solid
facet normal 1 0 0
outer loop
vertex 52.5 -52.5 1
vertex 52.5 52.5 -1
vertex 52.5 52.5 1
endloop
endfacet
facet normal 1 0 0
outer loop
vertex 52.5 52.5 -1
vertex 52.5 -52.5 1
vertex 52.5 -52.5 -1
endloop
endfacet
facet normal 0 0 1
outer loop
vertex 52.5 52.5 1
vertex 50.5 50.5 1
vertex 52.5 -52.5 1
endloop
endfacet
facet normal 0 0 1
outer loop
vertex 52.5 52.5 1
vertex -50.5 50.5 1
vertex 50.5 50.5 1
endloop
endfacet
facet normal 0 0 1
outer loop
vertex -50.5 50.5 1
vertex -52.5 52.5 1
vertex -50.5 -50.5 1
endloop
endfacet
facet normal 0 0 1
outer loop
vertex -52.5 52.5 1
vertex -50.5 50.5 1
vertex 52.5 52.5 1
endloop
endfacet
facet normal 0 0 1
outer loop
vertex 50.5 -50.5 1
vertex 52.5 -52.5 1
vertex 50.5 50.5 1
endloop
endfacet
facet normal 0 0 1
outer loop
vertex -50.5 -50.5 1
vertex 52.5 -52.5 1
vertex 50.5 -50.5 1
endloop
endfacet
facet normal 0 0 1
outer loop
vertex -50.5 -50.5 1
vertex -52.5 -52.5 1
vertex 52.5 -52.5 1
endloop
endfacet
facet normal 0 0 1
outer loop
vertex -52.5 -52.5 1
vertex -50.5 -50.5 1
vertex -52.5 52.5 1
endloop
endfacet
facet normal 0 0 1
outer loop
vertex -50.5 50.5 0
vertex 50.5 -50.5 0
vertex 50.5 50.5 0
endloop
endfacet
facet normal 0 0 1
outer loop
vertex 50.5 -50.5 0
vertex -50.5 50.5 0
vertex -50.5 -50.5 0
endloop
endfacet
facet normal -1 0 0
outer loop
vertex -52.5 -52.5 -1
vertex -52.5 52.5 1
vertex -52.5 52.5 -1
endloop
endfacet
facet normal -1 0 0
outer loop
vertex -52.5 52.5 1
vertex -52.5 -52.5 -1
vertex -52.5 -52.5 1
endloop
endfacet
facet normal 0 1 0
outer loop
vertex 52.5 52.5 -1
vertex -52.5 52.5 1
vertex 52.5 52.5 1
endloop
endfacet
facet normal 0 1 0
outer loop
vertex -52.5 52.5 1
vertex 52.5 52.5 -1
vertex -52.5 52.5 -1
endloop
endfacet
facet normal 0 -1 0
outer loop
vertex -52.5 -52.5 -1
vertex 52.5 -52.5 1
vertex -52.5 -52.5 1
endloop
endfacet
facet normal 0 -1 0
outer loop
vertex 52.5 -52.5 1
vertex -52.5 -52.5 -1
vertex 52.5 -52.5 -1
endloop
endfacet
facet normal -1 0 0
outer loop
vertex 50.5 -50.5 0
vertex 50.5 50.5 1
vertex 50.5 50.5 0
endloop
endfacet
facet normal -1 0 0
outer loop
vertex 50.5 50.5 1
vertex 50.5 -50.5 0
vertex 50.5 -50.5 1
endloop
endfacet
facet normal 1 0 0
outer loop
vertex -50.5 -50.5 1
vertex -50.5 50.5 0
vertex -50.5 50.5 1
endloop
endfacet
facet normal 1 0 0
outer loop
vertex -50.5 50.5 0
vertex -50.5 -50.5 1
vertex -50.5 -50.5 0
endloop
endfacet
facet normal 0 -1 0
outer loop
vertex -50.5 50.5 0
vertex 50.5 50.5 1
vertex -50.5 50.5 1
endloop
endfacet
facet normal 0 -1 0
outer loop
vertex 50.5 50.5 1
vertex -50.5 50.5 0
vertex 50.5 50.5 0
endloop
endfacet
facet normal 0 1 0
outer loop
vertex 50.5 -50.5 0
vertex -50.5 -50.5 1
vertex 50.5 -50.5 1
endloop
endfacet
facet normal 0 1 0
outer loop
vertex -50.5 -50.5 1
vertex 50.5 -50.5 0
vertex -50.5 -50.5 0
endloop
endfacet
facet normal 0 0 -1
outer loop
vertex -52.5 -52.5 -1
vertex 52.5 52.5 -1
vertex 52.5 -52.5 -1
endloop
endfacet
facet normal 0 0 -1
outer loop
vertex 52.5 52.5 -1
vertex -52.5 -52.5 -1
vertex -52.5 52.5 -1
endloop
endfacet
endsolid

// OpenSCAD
size = 100;
ext = 5;
wall = 4;
height = 1;

module img() {
	translate([-size/2,-size/2]) 
		linear_extrude(height, convexity= 4)
			resize([size,size]) 
				offset(r = 0.5) import("anonimous.dxf");
}

module base(height = height) {
	union() {
		img();
		circle(r = 16, h = 1);
	}
}

module sqbase(height = height, ext = ext) {
	cube([size + ext, size + ext, 1], center = true);
}

module positive() {
	union() {
		img();
		translate([0,0,-height / 2]) sqbase();
		translate([0,0,height / 2]) difference() {
			cube([size + ext, size + ext, height] , center = true);
			cube([size + ext - wall, size + ext- wall, height*1.001], center = true);
		}
	}
}

module negative() {
	difference() {
		cube([size + ext, size + ext, height * 2], center = true);
		translate([0, 0, -height * 0]) img();
	}
}

positive();
